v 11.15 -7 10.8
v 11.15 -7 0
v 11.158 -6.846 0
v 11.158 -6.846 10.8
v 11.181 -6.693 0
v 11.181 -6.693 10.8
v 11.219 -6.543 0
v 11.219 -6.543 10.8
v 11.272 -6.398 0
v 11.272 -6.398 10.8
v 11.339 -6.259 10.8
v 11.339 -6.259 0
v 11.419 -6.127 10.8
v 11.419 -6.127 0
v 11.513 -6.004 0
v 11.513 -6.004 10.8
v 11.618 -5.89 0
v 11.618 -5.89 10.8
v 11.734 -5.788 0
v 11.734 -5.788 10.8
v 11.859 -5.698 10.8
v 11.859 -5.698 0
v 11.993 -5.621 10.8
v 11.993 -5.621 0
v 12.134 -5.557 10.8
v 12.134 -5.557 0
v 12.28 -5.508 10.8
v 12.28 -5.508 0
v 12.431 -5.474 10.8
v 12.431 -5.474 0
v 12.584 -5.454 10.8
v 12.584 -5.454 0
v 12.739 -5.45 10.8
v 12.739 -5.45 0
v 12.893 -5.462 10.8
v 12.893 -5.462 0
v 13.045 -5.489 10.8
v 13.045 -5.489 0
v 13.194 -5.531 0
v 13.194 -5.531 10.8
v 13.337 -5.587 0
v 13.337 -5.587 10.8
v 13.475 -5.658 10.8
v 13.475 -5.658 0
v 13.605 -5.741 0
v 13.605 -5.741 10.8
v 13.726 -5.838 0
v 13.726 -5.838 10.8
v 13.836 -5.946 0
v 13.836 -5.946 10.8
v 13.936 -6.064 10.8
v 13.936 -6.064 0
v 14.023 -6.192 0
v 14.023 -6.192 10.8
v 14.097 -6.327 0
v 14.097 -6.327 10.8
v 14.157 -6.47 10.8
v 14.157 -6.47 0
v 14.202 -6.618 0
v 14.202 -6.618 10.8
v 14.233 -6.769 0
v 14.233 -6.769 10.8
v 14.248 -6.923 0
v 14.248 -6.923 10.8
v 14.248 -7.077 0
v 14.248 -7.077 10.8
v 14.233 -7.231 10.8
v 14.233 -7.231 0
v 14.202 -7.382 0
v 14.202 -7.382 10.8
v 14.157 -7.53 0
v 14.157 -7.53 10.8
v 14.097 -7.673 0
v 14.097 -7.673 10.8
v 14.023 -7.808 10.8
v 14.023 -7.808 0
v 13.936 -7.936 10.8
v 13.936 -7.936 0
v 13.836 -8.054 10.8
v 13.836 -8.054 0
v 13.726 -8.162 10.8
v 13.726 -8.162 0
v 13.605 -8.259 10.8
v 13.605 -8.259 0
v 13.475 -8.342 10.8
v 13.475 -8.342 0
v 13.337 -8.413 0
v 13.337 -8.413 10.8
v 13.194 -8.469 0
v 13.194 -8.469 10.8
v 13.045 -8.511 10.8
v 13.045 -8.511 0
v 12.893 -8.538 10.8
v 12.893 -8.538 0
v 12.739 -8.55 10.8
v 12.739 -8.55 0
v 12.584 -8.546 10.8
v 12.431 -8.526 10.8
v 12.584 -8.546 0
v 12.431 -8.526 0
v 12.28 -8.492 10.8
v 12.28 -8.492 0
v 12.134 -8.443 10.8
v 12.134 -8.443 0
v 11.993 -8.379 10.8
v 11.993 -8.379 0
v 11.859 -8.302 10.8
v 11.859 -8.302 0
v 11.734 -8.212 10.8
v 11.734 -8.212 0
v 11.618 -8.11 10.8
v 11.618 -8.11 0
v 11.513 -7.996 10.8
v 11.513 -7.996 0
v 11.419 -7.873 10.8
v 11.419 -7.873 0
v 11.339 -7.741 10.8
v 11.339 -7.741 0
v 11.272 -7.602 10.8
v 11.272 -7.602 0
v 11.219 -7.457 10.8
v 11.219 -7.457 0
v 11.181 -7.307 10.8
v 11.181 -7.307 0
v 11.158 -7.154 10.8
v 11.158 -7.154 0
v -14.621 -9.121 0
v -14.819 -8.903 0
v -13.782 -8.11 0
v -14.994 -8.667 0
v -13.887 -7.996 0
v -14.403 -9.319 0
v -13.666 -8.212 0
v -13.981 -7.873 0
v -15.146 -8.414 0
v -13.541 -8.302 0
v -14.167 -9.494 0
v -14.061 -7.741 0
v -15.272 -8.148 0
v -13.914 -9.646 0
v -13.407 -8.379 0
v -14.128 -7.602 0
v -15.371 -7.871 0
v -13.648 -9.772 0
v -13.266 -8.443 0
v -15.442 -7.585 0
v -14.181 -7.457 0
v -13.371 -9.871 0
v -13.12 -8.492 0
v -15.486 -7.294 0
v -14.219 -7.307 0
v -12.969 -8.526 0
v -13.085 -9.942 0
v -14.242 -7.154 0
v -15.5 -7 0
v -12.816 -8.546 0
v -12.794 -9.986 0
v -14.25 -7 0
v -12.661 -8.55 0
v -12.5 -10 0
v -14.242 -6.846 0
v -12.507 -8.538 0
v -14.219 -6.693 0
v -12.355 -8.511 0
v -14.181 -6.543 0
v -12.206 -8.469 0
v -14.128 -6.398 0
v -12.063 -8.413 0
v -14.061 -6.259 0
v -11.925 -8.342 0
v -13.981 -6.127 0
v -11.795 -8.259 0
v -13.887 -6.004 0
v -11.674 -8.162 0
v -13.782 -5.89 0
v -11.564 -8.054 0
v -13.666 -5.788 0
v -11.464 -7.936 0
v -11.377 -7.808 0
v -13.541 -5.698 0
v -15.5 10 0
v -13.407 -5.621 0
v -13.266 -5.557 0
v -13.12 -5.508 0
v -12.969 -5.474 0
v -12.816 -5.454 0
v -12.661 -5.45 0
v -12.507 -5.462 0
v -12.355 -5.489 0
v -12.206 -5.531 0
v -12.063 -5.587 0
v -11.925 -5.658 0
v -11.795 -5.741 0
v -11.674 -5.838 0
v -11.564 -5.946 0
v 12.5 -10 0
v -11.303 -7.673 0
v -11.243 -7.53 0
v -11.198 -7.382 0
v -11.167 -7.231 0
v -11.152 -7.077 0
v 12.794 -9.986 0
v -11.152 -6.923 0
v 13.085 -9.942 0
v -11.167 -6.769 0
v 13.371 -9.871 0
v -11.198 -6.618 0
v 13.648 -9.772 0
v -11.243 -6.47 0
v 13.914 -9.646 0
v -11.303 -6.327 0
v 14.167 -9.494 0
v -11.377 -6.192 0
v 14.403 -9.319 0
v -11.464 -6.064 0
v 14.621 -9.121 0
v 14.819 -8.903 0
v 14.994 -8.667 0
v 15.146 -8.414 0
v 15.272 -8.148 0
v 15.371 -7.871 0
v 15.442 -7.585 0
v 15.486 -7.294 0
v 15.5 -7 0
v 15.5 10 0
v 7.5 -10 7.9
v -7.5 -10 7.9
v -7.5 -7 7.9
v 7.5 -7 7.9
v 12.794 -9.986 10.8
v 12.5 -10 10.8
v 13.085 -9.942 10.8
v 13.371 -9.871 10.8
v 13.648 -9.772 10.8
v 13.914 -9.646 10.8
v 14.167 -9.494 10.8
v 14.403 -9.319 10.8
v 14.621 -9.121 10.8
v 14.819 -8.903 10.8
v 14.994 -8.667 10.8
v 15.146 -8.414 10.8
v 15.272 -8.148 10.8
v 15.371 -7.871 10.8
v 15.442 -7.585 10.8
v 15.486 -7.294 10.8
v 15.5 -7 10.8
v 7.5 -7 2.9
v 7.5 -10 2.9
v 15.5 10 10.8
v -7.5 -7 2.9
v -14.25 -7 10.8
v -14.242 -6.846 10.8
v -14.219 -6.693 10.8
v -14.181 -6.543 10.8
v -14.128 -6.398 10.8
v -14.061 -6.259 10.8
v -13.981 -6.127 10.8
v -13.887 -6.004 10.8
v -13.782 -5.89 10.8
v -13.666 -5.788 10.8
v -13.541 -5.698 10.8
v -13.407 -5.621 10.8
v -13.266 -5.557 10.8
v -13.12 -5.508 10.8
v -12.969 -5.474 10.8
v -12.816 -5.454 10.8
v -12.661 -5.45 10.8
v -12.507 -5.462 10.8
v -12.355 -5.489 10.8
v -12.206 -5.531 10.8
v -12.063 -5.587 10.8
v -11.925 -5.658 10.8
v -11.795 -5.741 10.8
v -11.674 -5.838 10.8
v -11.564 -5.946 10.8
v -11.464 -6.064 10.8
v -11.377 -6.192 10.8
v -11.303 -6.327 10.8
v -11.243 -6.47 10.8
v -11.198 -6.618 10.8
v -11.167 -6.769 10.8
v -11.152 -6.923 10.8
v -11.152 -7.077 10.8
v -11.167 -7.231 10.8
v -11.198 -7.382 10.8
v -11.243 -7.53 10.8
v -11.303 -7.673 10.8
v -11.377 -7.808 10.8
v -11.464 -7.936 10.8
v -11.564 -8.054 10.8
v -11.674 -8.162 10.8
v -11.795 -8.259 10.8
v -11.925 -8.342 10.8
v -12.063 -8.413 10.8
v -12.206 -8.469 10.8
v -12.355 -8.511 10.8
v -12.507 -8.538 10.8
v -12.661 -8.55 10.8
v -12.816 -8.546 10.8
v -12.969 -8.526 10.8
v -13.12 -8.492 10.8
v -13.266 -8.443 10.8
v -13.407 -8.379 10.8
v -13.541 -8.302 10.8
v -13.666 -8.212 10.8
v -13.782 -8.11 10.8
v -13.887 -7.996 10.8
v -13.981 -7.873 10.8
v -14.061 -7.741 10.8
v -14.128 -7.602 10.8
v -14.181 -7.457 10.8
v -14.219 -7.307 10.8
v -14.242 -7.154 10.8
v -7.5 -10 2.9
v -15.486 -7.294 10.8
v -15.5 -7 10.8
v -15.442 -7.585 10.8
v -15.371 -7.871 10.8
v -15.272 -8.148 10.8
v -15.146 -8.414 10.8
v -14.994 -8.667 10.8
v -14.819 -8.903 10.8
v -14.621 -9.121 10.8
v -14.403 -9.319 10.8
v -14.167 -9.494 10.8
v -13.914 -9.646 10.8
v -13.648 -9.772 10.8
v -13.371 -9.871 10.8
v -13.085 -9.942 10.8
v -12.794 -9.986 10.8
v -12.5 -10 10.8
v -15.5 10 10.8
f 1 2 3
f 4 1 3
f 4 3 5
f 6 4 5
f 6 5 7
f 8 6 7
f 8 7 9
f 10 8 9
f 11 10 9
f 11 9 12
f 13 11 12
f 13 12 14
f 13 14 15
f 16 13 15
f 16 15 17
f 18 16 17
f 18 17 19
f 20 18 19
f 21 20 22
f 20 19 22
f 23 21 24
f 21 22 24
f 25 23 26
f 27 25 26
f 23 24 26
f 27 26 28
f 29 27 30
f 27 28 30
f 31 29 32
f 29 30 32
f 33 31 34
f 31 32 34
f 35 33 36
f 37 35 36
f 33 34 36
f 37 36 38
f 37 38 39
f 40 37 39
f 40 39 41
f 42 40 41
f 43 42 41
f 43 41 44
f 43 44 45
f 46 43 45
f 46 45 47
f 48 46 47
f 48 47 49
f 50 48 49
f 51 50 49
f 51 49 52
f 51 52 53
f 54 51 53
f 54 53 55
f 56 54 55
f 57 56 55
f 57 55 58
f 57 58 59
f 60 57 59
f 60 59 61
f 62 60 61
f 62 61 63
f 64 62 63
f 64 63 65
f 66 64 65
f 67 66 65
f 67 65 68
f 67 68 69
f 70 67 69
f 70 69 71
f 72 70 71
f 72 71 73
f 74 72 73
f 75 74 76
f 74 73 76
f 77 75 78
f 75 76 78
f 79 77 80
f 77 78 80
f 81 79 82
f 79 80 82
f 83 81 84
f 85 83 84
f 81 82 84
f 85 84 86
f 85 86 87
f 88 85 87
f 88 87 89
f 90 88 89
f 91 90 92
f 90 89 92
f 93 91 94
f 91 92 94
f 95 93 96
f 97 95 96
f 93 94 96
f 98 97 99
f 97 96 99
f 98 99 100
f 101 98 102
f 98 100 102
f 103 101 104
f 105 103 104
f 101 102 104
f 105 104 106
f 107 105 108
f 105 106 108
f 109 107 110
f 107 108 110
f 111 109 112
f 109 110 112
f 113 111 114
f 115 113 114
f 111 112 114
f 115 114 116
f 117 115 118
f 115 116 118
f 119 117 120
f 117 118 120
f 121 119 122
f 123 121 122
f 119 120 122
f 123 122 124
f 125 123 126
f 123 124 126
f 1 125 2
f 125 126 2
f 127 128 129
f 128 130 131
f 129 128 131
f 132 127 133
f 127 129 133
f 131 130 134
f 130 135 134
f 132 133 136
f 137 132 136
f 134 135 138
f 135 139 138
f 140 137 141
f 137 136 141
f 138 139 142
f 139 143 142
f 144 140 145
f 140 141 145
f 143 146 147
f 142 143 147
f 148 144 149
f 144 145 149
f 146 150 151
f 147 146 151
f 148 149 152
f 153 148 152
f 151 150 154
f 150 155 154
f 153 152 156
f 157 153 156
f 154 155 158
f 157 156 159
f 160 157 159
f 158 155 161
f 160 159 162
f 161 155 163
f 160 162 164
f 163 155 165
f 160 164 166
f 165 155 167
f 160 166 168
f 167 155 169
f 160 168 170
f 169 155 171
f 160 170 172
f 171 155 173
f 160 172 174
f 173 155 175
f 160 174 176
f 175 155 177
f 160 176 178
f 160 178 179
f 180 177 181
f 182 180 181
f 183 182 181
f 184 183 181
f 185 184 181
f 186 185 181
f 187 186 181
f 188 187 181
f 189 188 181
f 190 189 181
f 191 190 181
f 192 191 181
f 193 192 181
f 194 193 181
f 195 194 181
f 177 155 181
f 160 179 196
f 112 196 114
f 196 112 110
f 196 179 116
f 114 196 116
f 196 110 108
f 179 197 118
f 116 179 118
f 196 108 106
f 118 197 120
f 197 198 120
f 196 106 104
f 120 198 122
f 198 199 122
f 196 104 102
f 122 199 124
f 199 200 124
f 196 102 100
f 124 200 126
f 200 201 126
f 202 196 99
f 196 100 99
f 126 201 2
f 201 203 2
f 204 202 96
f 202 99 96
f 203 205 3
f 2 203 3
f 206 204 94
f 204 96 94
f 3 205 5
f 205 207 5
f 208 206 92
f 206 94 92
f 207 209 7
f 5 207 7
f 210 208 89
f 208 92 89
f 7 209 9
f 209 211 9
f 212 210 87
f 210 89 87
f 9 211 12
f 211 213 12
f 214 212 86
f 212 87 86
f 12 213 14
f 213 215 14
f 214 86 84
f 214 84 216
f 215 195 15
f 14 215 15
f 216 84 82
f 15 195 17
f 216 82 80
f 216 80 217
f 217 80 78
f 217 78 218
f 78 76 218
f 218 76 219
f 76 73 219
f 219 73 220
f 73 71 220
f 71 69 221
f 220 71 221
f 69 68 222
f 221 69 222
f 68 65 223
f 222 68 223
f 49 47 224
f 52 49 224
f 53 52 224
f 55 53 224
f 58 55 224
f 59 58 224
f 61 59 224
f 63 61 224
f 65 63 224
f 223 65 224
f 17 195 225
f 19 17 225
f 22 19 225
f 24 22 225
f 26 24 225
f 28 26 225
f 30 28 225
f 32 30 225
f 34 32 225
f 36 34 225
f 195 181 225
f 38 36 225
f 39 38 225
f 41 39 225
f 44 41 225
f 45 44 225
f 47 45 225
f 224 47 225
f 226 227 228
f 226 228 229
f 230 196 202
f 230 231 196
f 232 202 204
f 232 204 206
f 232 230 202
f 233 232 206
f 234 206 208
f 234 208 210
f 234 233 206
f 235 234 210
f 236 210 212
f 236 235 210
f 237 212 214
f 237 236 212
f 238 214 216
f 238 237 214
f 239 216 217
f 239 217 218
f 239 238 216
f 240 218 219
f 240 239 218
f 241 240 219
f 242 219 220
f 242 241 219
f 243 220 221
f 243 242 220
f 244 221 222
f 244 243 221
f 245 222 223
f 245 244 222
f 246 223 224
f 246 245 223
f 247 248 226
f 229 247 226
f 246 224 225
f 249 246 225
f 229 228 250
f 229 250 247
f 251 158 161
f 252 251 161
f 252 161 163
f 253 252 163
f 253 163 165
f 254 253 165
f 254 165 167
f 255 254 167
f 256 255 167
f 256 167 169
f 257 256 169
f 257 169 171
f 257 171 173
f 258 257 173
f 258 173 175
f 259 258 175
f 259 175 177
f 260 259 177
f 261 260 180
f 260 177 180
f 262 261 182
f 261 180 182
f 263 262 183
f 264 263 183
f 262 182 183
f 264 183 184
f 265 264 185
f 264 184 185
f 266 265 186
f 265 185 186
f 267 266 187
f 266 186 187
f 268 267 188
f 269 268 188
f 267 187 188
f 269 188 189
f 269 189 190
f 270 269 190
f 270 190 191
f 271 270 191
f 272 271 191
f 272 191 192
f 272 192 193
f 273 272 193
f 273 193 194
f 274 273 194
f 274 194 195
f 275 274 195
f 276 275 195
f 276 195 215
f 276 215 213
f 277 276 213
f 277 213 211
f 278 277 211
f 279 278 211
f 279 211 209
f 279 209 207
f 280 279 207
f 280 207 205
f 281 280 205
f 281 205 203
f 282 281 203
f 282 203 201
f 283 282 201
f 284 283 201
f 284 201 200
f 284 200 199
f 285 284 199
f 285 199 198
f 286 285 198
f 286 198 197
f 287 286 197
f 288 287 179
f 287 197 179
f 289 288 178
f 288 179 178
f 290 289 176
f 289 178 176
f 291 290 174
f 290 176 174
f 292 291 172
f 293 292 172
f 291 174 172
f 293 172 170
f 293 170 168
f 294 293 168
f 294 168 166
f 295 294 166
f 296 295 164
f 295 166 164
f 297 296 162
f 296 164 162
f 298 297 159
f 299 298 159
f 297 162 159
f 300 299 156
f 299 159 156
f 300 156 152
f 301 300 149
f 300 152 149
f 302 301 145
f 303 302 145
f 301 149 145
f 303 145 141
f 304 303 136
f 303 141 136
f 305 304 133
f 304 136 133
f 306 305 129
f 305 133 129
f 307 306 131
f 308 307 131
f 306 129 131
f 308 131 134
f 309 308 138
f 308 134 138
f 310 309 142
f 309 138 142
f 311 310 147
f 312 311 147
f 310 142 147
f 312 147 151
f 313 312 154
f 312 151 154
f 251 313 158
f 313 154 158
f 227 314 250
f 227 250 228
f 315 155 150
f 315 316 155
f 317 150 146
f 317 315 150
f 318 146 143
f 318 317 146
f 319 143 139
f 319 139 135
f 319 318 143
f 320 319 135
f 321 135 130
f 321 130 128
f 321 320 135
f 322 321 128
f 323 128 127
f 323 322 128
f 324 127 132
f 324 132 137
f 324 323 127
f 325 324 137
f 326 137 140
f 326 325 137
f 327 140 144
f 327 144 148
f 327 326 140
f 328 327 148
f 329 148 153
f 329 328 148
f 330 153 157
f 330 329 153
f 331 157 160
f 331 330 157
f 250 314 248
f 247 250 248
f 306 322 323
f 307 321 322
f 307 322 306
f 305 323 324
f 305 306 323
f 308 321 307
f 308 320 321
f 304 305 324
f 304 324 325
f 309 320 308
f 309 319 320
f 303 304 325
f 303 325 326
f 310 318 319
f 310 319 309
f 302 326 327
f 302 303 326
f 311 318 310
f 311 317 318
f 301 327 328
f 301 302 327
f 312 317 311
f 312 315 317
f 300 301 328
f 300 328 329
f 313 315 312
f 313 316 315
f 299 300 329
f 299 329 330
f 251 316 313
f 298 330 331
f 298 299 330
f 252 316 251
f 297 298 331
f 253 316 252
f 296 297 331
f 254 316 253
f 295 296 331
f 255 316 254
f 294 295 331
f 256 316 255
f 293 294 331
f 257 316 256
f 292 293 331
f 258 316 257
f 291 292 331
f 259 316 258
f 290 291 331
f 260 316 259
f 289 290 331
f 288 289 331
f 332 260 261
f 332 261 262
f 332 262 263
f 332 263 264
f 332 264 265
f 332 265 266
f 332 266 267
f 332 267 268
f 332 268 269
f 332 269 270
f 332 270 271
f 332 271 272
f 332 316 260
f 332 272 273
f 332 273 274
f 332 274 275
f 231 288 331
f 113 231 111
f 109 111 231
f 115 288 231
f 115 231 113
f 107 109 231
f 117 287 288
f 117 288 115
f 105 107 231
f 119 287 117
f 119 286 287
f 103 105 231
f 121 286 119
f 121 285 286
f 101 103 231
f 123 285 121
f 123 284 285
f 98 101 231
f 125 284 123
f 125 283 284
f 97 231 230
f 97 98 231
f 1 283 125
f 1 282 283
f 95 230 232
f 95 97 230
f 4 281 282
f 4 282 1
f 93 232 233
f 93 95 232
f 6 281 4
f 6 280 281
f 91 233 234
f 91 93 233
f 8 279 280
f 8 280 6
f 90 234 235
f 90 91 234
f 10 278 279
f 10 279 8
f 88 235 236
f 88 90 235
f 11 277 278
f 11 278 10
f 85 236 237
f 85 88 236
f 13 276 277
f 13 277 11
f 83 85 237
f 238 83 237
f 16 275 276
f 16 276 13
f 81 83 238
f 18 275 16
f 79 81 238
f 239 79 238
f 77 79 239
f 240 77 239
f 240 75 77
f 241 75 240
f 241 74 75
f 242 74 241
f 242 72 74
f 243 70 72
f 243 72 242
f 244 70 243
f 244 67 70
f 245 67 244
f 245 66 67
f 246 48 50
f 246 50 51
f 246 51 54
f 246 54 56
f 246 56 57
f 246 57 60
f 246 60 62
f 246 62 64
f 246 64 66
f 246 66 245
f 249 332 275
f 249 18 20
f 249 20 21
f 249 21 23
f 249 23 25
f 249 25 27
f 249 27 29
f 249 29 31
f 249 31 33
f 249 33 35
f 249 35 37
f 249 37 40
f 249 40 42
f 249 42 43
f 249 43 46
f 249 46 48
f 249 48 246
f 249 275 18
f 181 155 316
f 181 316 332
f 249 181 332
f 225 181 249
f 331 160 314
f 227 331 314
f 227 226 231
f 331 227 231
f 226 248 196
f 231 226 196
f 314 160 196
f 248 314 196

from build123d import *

# Parameters (mm, degrees)
SKETCH_1_W          = 31
SKETCH_1_H          = 20
EXTRUDE_1_DEPTH     = 10.8
SKETCH_2_R          = 1.55
CUT_EXTRUDE_1_DEPTH = 22.37498538
FILLET_1_R          = 3
FILLET_2_R          = 3
SKETCH_3_W          = 15
SKETCH_3_H          = 5
CUT_EXTRUDE_2_DEPTH = 3


with BuildPart() as part:
    # 草图1 → 凸台-拉伸1 (new body)
    with BuildSketch(Plane.XY):
        Rectangle(SKETCH_1_W, SKETCH_1_H)
    extrude(amount=EXTRUDE_1_DEPTH)

    # 草图2 → 切除-拉伸1 (cut, through all)
    with BuildSketch(Plane(origin=(0, 0, 0), x_dir=(-1, 0, 0), z_dir=(0, 0, -1))):
        with Locations((-12.7, -7)):
            Circle(SKETCH_2_R)
        with Locations((12.7, -7)):
            Circle(SKETCH_2_R)
    extrude(amount=-CUT_EXTRUDE_1_DEPTH, mode=Mode.SUBTRACT)

    # 圆角1
    fillet_1_edges = [part.edges().sort_by_distance(p)[0] for p in [
        (-15.5, -10, 5.4),
    ]]
    fillet(fillet_1_edges, radius=FILLET_1_R)

    # 圆角2
    fillet_2_edges = [part.edges().sort_by_distance(p)[0] for p in [
        (15.5, -10, 5.4),
    ]]
    fillet(fillet_2_edges, radius=FILLET_2_R)

    # 草图3 → 切除-拉伸2 (cut)
    with BuildSketch(Plane.XZ.offset(10)):
        with Locations((0, 5.4)):
            Rectangle(SKETCH_3_W, SKETCH_3_H)
    extrude(amount=-CUT_EXTRUDE_2_DEPTH, mode=Mode.SUBTRACT)


solid = part.part
